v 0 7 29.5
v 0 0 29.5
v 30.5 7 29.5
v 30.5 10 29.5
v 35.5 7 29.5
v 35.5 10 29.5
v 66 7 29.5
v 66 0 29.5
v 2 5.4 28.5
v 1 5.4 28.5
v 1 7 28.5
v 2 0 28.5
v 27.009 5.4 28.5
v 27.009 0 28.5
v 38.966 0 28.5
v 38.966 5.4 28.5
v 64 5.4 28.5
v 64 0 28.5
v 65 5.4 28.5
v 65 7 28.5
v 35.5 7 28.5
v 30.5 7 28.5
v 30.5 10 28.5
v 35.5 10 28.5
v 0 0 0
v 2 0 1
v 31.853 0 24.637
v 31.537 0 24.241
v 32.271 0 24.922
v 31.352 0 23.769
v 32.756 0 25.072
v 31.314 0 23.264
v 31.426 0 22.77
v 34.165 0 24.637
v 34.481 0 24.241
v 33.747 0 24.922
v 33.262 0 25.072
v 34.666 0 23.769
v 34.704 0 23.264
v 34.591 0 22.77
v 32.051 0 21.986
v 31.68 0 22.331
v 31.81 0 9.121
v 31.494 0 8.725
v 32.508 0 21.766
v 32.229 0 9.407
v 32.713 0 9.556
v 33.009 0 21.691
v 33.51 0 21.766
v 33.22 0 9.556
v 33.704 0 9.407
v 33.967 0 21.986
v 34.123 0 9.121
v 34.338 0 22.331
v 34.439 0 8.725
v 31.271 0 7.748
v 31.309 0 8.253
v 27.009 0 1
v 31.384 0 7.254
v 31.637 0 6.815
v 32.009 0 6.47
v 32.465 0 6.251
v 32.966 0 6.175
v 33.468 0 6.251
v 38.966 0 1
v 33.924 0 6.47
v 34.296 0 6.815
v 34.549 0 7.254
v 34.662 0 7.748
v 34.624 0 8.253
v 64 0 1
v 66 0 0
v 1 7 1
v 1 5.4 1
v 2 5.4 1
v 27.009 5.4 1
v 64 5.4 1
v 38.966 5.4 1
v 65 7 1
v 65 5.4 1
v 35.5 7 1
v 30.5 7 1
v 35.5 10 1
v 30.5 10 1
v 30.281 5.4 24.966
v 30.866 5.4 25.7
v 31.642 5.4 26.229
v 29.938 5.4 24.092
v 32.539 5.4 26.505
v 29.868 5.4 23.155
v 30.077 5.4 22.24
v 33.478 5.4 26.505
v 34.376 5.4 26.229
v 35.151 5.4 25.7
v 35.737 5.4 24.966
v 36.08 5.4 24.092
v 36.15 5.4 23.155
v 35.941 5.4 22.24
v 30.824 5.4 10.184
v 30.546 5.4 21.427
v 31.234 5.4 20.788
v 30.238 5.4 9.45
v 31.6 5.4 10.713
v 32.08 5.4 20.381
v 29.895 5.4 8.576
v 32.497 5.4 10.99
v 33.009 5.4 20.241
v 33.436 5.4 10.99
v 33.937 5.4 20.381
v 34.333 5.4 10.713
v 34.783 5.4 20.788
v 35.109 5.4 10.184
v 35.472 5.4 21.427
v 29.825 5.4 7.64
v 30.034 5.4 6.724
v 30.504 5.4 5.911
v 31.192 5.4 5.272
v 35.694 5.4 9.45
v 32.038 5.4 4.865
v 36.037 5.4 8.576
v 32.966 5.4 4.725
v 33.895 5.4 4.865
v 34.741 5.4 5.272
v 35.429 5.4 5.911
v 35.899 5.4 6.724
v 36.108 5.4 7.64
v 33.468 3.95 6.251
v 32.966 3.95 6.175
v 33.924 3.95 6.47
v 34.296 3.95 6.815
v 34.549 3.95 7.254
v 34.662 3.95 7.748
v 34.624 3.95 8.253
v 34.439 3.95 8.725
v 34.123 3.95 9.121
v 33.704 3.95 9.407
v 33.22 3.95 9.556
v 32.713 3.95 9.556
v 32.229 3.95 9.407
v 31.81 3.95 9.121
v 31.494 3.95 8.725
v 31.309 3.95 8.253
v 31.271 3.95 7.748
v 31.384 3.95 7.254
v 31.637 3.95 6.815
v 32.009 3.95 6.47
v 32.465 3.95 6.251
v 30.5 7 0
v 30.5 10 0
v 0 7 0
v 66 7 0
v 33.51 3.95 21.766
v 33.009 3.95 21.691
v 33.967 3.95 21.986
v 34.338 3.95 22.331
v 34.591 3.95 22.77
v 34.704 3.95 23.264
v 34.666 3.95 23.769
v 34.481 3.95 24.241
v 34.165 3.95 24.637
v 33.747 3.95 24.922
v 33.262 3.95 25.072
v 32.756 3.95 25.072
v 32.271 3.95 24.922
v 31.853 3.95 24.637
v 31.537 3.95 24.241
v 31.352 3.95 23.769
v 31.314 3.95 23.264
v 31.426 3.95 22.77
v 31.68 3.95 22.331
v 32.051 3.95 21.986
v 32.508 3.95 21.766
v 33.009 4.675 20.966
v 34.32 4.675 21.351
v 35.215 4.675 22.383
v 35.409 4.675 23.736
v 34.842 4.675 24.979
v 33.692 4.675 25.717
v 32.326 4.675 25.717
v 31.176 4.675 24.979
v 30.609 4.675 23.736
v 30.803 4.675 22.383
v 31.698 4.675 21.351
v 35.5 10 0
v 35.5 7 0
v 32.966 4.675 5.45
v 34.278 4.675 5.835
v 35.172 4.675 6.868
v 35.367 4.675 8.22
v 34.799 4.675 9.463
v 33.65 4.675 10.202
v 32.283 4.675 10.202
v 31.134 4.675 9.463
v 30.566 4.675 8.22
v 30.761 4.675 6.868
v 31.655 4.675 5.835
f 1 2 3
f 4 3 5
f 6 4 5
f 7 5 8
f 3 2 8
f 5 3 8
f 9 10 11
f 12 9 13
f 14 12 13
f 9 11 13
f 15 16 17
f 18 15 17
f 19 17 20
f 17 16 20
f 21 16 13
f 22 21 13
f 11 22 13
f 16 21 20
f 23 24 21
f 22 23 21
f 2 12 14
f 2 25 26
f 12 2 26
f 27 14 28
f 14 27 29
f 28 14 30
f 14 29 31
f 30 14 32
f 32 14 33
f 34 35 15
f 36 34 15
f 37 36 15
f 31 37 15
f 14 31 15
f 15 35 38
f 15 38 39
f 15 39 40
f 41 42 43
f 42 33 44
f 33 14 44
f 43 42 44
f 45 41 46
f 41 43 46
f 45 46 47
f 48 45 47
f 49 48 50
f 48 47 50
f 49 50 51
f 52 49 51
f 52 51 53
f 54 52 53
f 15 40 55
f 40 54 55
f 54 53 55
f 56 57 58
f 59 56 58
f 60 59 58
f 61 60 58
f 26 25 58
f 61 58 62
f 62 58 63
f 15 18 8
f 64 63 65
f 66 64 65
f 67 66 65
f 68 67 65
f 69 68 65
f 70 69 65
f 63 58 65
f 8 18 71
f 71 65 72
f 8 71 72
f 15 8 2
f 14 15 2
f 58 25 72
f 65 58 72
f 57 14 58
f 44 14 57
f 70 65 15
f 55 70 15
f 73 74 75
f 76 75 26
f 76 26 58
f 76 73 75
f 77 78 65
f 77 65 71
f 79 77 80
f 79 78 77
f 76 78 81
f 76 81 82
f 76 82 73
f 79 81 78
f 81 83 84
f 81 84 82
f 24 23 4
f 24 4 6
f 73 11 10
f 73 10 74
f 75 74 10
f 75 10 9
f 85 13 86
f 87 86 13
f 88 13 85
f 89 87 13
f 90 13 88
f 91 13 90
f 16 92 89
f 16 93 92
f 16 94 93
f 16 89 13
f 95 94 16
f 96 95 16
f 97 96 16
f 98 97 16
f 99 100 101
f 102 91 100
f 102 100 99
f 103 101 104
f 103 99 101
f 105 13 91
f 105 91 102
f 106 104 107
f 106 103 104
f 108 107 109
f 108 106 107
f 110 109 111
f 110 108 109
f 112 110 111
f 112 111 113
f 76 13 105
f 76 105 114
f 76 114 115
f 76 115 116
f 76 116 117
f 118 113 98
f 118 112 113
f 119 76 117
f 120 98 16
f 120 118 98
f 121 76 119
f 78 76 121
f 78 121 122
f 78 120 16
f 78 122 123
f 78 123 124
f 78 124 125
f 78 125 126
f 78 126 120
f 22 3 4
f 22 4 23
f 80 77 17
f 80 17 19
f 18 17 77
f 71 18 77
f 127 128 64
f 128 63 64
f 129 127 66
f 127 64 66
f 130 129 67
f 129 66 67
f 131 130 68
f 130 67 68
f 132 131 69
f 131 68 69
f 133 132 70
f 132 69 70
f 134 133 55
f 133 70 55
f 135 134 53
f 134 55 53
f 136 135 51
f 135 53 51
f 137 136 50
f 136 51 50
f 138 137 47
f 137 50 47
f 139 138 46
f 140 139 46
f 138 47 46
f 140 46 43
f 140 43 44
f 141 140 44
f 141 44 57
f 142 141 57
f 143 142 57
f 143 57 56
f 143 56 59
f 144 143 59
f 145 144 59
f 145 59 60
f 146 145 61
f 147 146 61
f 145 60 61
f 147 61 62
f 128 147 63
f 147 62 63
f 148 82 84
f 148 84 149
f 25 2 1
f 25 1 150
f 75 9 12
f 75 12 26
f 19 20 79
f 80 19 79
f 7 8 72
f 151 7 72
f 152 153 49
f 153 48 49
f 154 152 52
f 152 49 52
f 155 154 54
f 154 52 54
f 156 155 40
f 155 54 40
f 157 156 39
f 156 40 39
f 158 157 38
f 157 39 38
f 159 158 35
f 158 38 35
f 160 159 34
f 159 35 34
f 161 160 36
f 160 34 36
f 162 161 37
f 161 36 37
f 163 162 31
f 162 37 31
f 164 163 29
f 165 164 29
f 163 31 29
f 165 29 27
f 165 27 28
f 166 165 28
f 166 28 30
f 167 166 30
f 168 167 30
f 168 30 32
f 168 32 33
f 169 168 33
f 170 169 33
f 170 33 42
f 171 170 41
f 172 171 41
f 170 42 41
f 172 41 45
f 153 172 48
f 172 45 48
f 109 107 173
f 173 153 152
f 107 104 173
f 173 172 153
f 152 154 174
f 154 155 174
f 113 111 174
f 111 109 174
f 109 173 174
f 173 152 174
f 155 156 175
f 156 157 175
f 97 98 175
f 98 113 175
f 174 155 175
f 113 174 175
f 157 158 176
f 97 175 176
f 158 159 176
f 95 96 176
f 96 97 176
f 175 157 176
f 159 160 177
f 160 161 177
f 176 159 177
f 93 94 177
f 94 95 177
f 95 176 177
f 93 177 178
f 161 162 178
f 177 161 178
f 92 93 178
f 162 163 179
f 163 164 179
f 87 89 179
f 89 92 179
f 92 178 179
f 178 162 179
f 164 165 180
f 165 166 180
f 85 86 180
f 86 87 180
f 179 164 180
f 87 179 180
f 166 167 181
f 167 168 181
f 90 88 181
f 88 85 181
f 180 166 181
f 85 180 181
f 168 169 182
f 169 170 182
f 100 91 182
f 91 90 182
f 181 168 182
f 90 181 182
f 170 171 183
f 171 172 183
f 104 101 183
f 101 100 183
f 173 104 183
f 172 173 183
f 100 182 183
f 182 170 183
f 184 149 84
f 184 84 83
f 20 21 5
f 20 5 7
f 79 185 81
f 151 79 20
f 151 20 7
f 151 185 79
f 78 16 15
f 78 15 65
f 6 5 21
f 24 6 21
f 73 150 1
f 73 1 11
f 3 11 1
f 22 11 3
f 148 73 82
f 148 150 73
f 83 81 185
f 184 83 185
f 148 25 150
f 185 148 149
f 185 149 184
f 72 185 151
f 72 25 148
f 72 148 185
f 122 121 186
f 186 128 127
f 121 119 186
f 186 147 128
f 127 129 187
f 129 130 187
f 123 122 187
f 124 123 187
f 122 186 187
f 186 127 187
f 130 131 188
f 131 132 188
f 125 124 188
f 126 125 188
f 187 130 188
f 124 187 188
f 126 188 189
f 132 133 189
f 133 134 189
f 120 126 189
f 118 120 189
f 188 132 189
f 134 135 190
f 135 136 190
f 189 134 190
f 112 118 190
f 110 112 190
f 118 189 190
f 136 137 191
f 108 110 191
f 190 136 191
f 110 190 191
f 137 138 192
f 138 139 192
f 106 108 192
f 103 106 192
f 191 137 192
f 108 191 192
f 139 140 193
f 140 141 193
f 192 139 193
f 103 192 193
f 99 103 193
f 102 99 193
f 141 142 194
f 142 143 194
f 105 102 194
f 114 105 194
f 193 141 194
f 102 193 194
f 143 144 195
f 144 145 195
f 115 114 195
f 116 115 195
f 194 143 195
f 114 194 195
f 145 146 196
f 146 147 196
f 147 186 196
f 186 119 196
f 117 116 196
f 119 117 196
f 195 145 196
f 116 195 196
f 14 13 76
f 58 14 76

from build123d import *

# Parameters (mm, degrees)
SKETCH1_W                                           = 66
SKETCH1_H                                           = 29.5
BOSS_EXTRUDE1_DEPTH                                 = 7
SKETCH18_W                                          = 5
SKETCH18_H                                          = 1
BOSS_EXTRUDE3_DEPTH                                 = 3
SKETCH2_W                                           = 64
SKETCH2_H                                           = 27.5
CUT_EXTRUDE1_DEPTH                                  = 1.6
SKETCH19_W                                          = 25.008900438
SKETCH19_H                                          = 27.5
SKETCH19_W_2                                        = 25.033550957
CUT_EXTRUDE3_DEPTH                                  = 10
CSK_FOR_M3_COUNTERSUNK_FLAT_HEAD_SCREW2_D           = 3.4
CSK_FOR_M3_COUNTERSUNK_FLAT_HEAD_SCREW2_CSINK_D     = 6.3
CSK_FOR_M3_COUNTERSUNK_FLAT_HEAD_SCREW2_CSINK_ANGLE = 90


with BuildPart() as part:
    # Sketch1 → Boss-Extrude1 (new body)
    with BuildSketch(Plane(origin=(0, 0, 0), x_dir=(1, 0, 0), z_dir=(0, 1, 0))):
        with Locations((33, -14.75)):
            Rectangle(SKETCH1_W, SKETCH1_H)
    extrude(amount=BOSS_EXTRUDE1_DEPTH)

    # Sketch18 → Boss-Extrude3 (add)
    with BuildSketch(Plane(origin=(0, 7, 0), x_dir=(1, 0, 0), z_dir=(0, 1, 0))):
        with Locations((33, -0.5)):
            Rectangle(SKETCH18_W, SKETCH18_H)
        with Locations((33, -29)):
            Rectangle(SKETCH18_W, SKETCH18_H)
    extrude(amount=BOSS_EXTRUDE3_DEPTH)

    # Sketch2 → Cut-Extrude1 (cut)
    with BuildSketch(Plane(origin=(0, 7, 0), x_dir=(1, 0, 0), z_dir=(0, 1, 0))):
        with Locations((33, -14.75)):
            Rectangle(SKETCH2_W, SKETCH2_H)
    extrude(amount=-CUT_EXTRUDE1_DEPTH, mode=Mode.SUBTRACT)

    # Sketch19 → Cut-Extrude3 (cut)
    with BuildSketch(Plane(origin=(0, 5.4, 0), x_dir=(1, 0, 0), z_dir=(0, 1, 0))):
        with Locations((14.504450219, -14.75)):
            Rectangle(SKETCH19_W, SKETCH19_H)
        with Locations((51.483224522, -14.75)):
            Rectangle(SKETCH19_W_2, SKETCH19_H)
    extrude(amount=-CUT_EXTRUDE3_DEPTH, mode=Mode.SUBTRACT)

    # CSK for M3 Countersunk Flat Head Screw2 (through all)
    with Locations(Plane(origin=(32.966449043, 5.4, 7.875), x_dir=(0, 0, 1), z_dir=(0, 1, 0))):
        with Locations((0, 0), (15.515633601, 0.042451395)):
            CounterSinkHole(CSK_FOR_M3_COUNTERSUNK_FLAT_HEAD_SCREW2_D / 2, CSK_FOR_M3_COUNTERSUNK_FLAT_HEAD_SCREW2_CSINK_D / 2, counter_sink_angle=CSK_FOR_M3_COUNTERSUNK_FLAT_HEAD_SCREW2_CSINK_ANGLE)


solid = part.part
